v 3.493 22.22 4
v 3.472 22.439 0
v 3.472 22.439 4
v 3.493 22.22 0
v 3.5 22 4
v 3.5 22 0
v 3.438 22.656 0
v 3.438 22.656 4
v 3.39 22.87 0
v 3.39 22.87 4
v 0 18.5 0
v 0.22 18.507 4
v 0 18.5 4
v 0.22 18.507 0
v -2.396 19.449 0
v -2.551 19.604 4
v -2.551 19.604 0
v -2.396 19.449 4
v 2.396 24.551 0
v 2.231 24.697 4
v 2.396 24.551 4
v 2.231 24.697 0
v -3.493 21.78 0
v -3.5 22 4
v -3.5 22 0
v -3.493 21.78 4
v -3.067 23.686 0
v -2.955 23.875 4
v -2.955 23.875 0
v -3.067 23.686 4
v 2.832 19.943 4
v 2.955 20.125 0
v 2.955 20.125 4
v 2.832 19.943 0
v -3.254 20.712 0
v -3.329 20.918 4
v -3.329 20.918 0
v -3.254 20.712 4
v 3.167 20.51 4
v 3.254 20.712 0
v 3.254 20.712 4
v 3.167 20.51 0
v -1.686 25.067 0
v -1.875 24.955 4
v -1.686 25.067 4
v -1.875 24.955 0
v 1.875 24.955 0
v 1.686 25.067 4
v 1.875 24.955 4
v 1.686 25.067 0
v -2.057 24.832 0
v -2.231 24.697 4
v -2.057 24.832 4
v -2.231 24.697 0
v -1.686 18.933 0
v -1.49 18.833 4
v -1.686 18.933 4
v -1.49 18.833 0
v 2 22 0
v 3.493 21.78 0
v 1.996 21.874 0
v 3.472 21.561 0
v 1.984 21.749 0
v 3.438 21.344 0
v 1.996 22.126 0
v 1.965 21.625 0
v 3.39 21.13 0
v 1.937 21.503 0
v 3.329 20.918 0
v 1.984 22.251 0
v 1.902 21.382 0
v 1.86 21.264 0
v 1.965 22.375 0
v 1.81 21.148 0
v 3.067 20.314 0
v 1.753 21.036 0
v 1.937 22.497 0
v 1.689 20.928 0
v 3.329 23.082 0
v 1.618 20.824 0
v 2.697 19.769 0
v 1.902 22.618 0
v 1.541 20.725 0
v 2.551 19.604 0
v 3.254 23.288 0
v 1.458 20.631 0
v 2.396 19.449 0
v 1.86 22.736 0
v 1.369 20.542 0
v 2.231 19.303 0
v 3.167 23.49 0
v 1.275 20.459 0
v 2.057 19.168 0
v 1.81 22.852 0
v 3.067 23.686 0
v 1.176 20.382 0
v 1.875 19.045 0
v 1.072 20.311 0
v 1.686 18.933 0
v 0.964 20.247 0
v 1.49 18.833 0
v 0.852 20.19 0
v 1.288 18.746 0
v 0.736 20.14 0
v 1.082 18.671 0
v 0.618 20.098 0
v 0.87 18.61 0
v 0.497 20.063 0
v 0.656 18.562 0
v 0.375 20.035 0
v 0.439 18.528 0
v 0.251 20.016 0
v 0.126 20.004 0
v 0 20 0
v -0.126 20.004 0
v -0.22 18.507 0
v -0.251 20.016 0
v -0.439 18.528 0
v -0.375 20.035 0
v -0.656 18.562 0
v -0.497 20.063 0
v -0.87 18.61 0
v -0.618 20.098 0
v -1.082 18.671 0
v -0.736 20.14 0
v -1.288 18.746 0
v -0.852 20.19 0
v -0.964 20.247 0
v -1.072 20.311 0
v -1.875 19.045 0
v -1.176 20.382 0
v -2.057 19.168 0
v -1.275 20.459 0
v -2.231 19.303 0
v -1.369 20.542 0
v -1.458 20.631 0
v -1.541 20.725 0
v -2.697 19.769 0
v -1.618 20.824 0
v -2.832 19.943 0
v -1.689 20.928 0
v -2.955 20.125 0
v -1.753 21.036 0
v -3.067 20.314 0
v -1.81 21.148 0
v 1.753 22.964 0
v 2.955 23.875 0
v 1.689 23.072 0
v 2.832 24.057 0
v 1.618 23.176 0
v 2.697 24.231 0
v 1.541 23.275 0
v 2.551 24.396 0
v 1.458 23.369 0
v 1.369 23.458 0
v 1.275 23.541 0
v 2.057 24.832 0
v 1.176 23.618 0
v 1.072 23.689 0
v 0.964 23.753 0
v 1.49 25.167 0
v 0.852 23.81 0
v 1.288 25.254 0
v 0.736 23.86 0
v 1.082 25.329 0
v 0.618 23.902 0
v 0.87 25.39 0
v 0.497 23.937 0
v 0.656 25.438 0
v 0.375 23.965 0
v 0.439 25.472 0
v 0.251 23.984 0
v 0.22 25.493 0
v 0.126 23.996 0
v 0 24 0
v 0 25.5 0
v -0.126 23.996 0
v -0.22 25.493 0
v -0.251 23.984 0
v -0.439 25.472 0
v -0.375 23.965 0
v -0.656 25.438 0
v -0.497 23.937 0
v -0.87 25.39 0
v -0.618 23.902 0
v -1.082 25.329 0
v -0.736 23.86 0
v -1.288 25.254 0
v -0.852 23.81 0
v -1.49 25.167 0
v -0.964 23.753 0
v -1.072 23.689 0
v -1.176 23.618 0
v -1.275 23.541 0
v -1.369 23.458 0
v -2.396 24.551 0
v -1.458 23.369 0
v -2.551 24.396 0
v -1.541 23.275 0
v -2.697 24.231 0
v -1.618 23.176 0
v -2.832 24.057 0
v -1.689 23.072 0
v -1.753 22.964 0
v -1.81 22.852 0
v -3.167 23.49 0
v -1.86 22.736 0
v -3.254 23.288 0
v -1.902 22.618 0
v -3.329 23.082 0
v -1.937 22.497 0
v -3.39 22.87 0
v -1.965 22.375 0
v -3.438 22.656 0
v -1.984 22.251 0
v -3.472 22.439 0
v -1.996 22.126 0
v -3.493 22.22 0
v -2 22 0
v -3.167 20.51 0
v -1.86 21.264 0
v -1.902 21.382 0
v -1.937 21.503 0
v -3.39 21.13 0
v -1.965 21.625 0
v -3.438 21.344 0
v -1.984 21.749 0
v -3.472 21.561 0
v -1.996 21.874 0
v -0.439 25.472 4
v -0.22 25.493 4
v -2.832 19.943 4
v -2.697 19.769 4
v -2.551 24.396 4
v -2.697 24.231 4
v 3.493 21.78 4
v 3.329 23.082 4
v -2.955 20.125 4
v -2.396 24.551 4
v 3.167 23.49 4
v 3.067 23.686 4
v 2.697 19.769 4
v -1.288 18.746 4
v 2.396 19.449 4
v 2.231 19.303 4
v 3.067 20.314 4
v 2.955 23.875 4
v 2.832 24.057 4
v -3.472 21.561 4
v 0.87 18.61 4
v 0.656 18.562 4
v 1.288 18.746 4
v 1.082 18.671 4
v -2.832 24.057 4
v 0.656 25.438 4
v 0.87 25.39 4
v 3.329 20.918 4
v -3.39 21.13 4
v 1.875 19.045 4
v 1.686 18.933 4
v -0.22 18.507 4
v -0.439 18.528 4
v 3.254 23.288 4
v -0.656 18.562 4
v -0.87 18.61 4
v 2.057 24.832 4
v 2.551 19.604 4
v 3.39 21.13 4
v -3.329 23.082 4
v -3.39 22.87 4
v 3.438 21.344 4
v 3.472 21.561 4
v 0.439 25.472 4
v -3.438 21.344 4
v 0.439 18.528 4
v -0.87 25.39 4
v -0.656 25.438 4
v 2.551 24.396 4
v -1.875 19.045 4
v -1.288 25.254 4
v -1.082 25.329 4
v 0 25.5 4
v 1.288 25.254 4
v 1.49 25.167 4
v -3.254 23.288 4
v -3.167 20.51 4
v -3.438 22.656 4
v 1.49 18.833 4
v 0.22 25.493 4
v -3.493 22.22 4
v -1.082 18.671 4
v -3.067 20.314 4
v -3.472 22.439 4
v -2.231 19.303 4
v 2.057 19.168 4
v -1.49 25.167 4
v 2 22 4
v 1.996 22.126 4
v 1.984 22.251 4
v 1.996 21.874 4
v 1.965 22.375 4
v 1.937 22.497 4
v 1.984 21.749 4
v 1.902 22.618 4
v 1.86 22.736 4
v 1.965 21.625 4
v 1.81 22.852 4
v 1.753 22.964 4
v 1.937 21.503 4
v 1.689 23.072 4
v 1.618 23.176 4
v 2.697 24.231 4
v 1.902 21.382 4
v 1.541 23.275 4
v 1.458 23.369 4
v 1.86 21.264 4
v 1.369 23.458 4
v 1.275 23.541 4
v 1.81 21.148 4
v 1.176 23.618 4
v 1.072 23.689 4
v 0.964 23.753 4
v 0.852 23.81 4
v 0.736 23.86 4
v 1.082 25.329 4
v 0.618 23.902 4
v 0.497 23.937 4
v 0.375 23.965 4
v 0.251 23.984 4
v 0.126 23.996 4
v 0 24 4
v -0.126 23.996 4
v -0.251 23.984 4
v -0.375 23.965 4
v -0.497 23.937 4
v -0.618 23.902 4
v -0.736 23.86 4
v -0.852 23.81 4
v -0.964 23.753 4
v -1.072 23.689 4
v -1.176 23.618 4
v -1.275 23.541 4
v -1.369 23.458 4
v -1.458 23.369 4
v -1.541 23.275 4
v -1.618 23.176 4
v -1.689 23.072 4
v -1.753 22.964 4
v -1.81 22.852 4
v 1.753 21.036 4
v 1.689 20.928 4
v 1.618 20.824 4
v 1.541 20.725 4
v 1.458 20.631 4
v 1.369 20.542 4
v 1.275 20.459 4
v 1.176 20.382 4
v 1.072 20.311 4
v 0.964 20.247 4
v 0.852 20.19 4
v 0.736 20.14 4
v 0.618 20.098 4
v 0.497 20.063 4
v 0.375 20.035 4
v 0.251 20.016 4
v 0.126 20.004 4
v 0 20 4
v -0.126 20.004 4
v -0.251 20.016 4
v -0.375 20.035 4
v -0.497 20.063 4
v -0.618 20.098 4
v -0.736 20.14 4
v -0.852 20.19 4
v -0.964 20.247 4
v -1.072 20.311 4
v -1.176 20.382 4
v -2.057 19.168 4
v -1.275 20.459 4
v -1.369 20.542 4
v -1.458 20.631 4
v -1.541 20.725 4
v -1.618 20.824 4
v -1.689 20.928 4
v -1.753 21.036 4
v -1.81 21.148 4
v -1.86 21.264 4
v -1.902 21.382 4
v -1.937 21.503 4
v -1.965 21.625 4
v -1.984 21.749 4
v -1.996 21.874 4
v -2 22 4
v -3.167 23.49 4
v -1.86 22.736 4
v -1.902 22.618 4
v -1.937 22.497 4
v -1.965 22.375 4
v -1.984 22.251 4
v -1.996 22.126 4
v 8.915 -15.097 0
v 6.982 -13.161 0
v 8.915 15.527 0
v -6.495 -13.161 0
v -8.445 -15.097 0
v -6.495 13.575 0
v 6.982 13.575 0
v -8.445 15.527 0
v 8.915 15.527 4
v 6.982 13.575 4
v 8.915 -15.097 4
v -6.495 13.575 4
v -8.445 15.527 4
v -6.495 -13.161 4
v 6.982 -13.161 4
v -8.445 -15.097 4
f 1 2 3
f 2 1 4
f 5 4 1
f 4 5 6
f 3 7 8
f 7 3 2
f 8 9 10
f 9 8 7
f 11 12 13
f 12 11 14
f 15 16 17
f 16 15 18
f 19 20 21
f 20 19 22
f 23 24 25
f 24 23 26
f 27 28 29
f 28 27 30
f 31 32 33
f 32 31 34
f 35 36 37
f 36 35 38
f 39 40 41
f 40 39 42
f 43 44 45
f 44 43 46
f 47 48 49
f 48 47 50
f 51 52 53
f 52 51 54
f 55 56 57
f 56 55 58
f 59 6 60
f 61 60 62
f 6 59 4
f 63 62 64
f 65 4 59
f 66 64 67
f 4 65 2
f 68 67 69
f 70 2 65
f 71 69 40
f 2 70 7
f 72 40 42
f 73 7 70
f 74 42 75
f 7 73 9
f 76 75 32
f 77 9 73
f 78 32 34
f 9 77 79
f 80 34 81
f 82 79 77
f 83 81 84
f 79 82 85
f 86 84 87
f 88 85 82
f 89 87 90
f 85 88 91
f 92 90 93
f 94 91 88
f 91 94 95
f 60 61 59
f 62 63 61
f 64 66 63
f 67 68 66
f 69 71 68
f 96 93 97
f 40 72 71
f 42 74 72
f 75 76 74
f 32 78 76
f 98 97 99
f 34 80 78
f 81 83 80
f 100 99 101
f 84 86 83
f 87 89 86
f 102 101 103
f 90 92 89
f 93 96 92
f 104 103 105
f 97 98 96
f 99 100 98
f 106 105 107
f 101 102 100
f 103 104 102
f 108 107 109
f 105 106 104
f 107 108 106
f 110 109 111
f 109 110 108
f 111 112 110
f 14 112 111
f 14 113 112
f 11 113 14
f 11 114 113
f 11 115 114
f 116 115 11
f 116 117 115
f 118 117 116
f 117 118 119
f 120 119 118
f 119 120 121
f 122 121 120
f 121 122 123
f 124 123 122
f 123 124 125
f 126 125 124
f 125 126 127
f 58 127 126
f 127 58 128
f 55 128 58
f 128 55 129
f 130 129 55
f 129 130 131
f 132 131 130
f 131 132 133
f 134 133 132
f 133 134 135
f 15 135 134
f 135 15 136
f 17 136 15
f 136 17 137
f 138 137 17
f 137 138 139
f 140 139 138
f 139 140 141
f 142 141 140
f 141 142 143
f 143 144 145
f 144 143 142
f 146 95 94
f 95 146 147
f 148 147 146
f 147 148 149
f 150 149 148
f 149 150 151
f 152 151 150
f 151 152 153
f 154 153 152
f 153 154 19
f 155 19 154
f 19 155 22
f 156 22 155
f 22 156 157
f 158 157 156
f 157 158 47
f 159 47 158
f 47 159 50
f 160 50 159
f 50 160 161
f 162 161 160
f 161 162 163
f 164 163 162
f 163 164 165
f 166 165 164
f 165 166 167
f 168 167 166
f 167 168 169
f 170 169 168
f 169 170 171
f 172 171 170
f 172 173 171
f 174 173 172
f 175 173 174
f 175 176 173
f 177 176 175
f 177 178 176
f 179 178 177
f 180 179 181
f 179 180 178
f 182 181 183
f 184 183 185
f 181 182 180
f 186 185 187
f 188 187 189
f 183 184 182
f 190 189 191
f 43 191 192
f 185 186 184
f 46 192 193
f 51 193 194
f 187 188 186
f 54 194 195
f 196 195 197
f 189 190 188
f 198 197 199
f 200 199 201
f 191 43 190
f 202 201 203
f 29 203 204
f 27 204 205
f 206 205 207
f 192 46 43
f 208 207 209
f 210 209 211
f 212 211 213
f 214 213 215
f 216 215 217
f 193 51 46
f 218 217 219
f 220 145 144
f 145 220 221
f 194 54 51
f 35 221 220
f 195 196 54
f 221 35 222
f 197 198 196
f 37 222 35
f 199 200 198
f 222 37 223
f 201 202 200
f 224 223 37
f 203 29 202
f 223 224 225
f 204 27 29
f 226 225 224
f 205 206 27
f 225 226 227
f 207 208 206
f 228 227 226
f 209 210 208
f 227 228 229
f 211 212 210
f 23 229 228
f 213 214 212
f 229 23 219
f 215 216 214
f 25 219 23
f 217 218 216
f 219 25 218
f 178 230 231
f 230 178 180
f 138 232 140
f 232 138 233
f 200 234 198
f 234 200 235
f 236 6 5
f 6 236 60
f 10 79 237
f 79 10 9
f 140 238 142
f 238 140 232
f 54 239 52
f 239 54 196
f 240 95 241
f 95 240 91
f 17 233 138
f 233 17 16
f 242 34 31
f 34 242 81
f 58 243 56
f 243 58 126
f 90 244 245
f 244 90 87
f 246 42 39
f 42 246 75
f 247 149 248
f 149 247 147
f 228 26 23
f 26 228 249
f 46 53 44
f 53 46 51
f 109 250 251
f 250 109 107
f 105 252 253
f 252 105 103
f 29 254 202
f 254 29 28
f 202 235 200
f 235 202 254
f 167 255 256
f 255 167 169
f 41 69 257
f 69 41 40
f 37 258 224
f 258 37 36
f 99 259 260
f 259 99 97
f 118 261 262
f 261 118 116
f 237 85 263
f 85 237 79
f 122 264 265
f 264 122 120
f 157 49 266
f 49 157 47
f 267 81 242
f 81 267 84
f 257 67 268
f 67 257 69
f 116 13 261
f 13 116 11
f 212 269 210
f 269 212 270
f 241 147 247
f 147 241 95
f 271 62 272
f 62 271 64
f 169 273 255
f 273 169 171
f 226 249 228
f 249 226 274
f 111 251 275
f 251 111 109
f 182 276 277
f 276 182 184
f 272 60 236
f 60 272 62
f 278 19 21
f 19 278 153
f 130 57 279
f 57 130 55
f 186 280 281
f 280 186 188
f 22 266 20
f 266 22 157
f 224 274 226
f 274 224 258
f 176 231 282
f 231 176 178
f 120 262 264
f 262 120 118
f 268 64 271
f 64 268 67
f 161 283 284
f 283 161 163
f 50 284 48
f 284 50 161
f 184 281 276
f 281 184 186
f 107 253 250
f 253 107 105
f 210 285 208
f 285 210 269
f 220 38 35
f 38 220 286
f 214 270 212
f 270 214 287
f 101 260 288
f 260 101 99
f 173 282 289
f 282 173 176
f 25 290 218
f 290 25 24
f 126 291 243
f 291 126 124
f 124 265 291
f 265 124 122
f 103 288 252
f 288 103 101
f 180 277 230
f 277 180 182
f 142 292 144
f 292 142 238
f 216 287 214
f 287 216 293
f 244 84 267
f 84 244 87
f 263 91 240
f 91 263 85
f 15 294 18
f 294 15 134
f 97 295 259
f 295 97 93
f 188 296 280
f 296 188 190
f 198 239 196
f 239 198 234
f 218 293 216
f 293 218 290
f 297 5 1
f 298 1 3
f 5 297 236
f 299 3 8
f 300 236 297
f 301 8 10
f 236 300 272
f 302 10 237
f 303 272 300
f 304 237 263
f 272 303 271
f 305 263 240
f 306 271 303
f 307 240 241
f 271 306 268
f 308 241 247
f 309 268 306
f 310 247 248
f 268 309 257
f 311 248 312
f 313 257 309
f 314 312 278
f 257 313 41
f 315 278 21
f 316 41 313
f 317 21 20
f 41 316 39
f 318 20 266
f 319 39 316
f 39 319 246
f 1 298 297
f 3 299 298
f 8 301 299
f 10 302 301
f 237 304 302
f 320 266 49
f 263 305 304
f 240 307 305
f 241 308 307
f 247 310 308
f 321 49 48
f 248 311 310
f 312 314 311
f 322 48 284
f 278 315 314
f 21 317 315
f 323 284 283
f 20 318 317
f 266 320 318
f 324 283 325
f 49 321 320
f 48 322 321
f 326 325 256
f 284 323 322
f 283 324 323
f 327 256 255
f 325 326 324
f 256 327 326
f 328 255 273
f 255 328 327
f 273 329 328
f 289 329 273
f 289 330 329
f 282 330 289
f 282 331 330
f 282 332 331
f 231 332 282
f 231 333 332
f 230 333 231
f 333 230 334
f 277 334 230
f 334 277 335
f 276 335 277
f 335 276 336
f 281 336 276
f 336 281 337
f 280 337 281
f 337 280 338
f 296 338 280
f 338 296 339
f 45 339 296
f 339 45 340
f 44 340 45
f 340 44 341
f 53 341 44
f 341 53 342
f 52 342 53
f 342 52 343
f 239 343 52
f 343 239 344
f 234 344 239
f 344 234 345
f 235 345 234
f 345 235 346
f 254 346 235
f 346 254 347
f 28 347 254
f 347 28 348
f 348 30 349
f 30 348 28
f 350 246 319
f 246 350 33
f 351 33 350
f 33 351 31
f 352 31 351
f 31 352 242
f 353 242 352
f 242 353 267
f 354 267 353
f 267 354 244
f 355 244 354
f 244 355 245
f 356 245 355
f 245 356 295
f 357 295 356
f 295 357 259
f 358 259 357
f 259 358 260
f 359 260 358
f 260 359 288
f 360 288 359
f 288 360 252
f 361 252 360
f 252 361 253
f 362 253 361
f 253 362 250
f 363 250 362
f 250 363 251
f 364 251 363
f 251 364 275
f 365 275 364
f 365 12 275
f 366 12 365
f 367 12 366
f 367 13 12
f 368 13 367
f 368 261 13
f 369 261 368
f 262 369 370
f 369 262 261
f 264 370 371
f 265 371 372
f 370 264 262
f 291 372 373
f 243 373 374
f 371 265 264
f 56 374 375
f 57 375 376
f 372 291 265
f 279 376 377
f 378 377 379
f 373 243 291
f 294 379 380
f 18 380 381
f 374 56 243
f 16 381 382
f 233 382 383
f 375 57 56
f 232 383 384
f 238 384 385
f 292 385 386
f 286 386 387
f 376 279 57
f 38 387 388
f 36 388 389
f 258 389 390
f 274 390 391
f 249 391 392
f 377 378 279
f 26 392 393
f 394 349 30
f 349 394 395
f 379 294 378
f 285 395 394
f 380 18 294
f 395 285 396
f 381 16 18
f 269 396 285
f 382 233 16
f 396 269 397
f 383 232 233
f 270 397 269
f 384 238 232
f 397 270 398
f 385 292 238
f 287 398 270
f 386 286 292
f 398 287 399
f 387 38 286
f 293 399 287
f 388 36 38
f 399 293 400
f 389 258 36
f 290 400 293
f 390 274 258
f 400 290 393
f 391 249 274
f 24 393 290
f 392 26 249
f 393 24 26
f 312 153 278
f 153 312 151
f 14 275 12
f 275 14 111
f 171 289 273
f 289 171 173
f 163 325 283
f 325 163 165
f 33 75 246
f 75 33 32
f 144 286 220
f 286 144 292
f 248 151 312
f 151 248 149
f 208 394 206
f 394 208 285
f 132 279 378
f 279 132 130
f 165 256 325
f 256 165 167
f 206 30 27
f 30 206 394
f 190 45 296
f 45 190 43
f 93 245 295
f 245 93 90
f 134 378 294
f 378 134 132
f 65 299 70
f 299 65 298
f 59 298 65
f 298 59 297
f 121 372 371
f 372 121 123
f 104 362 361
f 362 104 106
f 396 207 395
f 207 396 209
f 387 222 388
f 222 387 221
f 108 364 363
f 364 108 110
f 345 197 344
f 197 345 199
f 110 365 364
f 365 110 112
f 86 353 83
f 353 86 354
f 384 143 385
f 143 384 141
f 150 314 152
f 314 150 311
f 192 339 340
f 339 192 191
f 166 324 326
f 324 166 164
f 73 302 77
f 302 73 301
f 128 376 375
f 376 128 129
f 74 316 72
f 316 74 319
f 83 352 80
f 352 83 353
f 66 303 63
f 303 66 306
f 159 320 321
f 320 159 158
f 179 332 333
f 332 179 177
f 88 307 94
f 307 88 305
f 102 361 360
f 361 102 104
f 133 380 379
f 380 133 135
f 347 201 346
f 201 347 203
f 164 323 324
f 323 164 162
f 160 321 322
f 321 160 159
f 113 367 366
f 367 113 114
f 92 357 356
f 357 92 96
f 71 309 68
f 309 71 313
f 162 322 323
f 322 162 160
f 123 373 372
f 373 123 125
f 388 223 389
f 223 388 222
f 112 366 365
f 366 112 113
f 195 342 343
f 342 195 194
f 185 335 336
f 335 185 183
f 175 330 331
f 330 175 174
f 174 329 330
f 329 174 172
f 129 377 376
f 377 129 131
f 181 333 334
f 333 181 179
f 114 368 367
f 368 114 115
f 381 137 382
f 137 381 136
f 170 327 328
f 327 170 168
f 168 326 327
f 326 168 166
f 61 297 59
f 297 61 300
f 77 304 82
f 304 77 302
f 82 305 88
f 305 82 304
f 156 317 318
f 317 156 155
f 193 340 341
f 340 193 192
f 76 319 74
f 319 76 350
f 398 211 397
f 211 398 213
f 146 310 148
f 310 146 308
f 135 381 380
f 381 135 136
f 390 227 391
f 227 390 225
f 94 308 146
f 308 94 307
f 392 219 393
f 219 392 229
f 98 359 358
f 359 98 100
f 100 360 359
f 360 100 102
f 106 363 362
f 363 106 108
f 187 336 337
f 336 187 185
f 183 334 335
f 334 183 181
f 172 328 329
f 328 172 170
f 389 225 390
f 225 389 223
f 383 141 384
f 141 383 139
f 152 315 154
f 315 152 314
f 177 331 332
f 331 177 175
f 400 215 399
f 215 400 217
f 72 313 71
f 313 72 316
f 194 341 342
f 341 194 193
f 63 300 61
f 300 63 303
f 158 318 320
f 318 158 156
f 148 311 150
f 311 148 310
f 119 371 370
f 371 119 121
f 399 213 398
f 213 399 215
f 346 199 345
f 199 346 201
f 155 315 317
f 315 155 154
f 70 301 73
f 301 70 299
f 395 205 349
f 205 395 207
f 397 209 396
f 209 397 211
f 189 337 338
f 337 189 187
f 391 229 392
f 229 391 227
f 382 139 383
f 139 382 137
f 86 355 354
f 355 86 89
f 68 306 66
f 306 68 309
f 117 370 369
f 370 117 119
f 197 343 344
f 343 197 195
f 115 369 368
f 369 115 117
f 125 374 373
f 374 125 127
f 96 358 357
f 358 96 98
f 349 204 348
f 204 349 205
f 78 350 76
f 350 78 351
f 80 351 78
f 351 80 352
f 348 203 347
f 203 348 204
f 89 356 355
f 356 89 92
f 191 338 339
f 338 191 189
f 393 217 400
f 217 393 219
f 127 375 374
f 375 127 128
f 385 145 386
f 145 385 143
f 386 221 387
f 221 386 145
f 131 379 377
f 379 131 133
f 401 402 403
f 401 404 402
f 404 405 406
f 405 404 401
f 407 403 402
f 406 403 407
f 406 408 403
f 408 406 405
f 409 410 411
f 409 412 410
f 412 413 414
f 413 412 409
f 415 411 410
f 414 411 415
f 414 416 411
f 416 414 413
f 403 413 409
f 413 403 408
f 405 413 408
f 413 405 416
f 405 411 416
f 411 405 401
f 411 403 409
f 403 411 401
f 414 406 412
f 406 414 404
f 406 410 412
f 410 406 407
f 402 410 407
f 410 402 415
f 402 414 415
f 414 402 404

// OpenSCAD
// keychain hole
translate([0,22,0])difference(){
    cylinder(r=3.5,h=4,$fn=100);
    cylinder(r=2,h=4,$fn=100);
}


difference(){
    //cylinder(r=25,h=4,$fn=100);
    linear_extrude(4){
        text("🤗",size = 25,valign = "center",halign = "center",font = "Segoe UI Emoji",$fn=100);
    }
}
